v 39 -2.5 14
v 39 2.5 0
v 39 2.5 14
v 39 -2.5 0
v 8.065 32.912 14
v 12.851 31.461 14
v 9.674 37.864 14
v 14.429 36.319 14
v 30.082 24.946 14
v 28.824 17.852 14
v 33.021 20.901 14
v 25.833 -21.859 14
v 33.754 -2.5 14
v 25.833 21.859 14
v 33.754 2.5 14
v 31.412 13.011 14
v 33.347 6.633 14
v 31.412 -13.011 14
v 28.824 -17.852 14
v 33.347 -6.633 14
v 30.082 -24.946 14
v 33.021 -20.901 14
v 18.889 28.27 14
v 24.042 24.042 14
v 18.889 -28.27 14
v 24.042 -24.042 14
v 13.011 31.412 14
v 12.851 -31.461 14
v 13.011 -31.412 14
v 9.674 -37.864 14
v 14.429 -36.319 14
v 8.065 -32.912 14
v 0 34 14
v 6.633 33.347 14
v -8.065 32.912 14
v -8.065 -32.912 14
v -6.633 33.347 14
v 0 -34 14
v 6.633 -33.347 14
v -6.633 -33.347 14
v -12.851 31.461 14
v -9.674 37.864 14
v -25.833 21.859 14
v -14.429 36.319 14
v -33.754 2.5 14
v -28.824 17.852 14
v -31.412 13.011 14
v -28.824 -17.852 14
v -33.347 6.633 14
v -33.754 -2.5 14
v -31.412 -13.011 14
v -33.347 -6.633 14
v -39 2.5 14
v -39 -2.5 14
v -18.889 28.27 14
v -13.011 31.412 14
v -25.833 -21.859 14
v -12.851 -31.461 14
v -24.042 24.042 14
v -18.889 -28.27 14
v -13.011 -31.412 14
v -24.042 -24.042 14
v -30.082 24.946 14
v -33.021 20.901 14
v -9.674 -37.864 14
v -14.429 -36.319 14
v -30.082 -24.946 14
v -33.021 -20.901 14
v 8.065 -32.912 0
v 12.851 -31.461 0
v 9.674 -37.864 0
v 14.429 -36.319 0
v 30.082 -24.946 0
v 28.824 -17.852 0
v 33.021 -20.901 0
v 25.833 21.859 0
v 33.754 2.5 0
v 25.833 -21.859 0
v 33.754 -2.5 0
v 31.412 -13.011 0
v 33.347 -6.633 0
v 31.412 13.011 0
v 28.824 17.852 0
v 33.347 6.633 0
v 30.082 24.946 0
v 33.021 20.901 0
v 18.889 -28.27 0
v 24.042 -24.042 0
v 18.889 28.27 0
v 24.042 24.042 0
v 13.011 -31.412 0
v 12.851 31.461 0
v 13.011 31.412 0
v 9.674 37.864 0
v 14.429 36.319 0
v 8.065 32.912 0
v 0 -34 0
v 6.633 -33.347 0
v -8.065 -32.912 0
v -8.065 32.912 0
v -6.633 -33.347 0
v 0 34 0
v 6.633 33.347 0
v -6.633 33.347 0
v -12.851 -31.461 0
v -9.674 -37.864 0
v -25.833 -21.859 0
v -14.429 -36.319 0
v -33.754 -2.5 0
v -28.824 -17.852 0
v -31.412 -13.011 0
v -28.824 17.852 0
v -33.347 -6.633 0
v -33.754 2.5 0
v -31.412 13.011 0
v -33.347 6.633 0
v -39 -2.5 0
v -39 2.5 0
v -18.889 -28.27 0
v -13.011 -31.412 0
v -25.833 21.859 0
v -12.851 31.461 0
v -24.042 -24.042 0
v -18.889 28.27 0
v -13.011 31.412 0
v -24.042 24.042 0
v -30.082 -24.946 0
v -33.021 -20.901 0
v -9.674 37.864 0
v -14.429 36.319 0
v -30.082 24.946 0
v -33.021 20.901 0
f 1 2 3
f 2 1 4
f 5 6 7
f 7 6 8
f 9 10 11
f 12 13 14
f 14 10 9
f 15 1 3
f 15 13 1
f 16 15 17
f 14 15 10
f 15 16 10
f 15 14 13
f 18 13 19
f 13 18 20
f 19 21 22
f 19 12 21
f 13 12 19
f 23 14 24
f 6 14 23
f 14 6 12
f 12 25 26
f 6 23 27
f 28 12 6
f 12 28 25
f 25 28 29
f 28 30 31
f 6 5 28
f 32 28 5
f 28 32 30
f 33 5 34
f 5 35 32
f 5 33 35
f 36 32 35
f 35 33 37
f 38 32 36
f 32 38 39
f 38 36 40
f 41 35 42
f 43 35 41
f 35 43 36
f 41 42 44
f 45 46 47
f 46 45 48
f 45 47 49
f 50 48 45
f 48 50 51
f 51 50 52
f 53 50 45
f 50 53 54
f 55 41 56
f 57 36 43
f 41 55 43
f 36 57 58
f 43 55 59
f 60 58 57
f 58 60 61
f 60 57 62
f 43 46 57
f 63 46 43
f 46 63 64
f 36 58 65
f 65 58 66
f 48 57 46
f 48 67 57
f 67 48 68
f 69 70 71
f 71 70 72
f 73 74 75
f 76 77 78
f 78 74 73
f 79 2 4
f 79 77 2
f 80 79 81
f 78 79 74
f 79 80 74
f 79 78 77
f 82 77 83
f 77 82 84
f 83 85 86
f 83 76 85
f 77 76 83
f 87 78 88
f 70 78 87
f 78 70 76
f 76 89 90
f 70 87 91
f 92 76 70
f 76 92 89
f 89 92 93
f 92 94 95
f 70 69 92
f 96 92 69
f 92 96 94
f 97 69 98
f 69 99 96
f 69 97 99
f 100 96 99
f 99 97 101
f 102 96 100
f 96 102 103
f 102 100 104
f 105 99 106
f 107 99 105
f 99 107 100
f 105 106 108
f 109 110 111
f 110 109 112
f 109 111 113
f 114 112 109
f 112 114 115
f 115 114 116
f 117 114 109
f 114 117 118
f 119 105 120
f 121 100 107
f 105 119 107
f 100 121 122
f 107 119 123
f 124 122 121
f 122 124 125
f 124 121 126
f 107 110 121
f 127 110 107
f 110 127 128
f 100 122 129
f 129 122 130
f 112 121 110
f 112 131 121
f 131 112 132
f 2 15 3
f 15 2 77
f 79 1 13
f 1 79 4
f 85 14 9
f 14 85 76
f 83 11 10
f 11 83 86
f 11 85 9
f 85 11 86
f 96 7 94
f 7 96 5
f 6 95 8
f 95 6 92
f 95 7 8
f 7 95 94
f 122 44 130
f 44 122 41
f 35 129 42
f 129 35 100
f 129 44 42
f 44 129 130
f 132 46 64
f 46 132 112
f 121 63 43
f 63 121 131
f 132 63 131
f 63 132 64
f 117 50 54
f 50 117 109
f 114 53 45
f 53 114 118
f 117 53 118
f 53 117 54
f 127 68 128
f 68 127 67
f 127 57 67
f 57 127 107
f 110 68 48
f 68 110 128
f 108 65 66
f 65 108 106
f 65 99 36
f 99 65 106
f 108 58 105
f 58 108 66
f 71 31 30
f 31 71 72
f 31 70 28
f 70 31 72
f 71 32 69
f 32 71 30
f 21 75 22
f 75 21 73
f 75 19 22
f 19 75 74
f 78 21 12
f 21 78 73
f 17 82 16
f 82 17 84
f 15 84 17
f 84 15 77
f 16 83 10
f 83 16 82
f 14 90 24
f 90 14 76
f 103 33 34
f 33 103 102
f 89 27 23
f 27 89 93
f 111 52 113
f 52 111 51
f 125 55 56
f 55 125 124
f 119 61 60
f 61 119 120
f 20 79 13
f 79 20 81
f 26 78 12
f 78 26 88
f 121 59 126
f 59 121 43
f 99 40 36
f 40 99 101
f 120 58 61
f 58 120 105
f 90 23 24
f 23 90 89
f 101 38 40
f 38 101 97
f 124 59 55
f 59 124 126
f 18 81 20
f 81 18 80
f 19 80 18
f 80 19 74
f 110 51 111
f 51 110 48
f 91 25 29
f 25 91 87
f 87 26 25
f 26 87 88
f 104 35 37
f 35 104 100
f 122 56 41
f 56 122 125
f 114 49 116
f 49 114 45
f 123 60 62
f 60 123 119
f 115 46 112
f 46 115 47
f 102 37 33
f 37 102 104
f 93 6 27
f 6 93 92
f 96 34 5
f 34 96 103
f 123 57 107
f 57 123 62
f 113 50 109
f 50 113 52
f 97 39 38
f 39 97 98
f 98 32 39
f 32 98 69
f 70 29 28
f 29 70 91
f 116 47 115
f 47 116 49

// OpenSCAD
$fn = 32;

// ----------------------------------------------------------------------
// Spur blank: plain gear blank
// ----------------------------------------------------------------------

// --- parameters (mm) ---
disc_r = 34;              // blank root radius
disc_t = 14;              // blank thickness
n_teeth = 10;             // stub tooth count
tooth_w = 5;              // tooth width at the root
tooth_h = 5;              // tooth height above the root

out_r = disc_r + tooth_h;  // tip radius
bbox_x = 78.0;  // measured width over the teeth
bbox_y = 75.73;  // measured depth over the teeth

union() {
  cylinder(r = disc_r, h = disc_t);
  for (i = [0 : n_teeth - 1])
    rotate([0, 0, i * 360 / n_teeth])
      translate([disc_r - 1, -tooth_w / 2, 0])
        cube([tooth_h + 1, tooth_w, disc_t]);
}
